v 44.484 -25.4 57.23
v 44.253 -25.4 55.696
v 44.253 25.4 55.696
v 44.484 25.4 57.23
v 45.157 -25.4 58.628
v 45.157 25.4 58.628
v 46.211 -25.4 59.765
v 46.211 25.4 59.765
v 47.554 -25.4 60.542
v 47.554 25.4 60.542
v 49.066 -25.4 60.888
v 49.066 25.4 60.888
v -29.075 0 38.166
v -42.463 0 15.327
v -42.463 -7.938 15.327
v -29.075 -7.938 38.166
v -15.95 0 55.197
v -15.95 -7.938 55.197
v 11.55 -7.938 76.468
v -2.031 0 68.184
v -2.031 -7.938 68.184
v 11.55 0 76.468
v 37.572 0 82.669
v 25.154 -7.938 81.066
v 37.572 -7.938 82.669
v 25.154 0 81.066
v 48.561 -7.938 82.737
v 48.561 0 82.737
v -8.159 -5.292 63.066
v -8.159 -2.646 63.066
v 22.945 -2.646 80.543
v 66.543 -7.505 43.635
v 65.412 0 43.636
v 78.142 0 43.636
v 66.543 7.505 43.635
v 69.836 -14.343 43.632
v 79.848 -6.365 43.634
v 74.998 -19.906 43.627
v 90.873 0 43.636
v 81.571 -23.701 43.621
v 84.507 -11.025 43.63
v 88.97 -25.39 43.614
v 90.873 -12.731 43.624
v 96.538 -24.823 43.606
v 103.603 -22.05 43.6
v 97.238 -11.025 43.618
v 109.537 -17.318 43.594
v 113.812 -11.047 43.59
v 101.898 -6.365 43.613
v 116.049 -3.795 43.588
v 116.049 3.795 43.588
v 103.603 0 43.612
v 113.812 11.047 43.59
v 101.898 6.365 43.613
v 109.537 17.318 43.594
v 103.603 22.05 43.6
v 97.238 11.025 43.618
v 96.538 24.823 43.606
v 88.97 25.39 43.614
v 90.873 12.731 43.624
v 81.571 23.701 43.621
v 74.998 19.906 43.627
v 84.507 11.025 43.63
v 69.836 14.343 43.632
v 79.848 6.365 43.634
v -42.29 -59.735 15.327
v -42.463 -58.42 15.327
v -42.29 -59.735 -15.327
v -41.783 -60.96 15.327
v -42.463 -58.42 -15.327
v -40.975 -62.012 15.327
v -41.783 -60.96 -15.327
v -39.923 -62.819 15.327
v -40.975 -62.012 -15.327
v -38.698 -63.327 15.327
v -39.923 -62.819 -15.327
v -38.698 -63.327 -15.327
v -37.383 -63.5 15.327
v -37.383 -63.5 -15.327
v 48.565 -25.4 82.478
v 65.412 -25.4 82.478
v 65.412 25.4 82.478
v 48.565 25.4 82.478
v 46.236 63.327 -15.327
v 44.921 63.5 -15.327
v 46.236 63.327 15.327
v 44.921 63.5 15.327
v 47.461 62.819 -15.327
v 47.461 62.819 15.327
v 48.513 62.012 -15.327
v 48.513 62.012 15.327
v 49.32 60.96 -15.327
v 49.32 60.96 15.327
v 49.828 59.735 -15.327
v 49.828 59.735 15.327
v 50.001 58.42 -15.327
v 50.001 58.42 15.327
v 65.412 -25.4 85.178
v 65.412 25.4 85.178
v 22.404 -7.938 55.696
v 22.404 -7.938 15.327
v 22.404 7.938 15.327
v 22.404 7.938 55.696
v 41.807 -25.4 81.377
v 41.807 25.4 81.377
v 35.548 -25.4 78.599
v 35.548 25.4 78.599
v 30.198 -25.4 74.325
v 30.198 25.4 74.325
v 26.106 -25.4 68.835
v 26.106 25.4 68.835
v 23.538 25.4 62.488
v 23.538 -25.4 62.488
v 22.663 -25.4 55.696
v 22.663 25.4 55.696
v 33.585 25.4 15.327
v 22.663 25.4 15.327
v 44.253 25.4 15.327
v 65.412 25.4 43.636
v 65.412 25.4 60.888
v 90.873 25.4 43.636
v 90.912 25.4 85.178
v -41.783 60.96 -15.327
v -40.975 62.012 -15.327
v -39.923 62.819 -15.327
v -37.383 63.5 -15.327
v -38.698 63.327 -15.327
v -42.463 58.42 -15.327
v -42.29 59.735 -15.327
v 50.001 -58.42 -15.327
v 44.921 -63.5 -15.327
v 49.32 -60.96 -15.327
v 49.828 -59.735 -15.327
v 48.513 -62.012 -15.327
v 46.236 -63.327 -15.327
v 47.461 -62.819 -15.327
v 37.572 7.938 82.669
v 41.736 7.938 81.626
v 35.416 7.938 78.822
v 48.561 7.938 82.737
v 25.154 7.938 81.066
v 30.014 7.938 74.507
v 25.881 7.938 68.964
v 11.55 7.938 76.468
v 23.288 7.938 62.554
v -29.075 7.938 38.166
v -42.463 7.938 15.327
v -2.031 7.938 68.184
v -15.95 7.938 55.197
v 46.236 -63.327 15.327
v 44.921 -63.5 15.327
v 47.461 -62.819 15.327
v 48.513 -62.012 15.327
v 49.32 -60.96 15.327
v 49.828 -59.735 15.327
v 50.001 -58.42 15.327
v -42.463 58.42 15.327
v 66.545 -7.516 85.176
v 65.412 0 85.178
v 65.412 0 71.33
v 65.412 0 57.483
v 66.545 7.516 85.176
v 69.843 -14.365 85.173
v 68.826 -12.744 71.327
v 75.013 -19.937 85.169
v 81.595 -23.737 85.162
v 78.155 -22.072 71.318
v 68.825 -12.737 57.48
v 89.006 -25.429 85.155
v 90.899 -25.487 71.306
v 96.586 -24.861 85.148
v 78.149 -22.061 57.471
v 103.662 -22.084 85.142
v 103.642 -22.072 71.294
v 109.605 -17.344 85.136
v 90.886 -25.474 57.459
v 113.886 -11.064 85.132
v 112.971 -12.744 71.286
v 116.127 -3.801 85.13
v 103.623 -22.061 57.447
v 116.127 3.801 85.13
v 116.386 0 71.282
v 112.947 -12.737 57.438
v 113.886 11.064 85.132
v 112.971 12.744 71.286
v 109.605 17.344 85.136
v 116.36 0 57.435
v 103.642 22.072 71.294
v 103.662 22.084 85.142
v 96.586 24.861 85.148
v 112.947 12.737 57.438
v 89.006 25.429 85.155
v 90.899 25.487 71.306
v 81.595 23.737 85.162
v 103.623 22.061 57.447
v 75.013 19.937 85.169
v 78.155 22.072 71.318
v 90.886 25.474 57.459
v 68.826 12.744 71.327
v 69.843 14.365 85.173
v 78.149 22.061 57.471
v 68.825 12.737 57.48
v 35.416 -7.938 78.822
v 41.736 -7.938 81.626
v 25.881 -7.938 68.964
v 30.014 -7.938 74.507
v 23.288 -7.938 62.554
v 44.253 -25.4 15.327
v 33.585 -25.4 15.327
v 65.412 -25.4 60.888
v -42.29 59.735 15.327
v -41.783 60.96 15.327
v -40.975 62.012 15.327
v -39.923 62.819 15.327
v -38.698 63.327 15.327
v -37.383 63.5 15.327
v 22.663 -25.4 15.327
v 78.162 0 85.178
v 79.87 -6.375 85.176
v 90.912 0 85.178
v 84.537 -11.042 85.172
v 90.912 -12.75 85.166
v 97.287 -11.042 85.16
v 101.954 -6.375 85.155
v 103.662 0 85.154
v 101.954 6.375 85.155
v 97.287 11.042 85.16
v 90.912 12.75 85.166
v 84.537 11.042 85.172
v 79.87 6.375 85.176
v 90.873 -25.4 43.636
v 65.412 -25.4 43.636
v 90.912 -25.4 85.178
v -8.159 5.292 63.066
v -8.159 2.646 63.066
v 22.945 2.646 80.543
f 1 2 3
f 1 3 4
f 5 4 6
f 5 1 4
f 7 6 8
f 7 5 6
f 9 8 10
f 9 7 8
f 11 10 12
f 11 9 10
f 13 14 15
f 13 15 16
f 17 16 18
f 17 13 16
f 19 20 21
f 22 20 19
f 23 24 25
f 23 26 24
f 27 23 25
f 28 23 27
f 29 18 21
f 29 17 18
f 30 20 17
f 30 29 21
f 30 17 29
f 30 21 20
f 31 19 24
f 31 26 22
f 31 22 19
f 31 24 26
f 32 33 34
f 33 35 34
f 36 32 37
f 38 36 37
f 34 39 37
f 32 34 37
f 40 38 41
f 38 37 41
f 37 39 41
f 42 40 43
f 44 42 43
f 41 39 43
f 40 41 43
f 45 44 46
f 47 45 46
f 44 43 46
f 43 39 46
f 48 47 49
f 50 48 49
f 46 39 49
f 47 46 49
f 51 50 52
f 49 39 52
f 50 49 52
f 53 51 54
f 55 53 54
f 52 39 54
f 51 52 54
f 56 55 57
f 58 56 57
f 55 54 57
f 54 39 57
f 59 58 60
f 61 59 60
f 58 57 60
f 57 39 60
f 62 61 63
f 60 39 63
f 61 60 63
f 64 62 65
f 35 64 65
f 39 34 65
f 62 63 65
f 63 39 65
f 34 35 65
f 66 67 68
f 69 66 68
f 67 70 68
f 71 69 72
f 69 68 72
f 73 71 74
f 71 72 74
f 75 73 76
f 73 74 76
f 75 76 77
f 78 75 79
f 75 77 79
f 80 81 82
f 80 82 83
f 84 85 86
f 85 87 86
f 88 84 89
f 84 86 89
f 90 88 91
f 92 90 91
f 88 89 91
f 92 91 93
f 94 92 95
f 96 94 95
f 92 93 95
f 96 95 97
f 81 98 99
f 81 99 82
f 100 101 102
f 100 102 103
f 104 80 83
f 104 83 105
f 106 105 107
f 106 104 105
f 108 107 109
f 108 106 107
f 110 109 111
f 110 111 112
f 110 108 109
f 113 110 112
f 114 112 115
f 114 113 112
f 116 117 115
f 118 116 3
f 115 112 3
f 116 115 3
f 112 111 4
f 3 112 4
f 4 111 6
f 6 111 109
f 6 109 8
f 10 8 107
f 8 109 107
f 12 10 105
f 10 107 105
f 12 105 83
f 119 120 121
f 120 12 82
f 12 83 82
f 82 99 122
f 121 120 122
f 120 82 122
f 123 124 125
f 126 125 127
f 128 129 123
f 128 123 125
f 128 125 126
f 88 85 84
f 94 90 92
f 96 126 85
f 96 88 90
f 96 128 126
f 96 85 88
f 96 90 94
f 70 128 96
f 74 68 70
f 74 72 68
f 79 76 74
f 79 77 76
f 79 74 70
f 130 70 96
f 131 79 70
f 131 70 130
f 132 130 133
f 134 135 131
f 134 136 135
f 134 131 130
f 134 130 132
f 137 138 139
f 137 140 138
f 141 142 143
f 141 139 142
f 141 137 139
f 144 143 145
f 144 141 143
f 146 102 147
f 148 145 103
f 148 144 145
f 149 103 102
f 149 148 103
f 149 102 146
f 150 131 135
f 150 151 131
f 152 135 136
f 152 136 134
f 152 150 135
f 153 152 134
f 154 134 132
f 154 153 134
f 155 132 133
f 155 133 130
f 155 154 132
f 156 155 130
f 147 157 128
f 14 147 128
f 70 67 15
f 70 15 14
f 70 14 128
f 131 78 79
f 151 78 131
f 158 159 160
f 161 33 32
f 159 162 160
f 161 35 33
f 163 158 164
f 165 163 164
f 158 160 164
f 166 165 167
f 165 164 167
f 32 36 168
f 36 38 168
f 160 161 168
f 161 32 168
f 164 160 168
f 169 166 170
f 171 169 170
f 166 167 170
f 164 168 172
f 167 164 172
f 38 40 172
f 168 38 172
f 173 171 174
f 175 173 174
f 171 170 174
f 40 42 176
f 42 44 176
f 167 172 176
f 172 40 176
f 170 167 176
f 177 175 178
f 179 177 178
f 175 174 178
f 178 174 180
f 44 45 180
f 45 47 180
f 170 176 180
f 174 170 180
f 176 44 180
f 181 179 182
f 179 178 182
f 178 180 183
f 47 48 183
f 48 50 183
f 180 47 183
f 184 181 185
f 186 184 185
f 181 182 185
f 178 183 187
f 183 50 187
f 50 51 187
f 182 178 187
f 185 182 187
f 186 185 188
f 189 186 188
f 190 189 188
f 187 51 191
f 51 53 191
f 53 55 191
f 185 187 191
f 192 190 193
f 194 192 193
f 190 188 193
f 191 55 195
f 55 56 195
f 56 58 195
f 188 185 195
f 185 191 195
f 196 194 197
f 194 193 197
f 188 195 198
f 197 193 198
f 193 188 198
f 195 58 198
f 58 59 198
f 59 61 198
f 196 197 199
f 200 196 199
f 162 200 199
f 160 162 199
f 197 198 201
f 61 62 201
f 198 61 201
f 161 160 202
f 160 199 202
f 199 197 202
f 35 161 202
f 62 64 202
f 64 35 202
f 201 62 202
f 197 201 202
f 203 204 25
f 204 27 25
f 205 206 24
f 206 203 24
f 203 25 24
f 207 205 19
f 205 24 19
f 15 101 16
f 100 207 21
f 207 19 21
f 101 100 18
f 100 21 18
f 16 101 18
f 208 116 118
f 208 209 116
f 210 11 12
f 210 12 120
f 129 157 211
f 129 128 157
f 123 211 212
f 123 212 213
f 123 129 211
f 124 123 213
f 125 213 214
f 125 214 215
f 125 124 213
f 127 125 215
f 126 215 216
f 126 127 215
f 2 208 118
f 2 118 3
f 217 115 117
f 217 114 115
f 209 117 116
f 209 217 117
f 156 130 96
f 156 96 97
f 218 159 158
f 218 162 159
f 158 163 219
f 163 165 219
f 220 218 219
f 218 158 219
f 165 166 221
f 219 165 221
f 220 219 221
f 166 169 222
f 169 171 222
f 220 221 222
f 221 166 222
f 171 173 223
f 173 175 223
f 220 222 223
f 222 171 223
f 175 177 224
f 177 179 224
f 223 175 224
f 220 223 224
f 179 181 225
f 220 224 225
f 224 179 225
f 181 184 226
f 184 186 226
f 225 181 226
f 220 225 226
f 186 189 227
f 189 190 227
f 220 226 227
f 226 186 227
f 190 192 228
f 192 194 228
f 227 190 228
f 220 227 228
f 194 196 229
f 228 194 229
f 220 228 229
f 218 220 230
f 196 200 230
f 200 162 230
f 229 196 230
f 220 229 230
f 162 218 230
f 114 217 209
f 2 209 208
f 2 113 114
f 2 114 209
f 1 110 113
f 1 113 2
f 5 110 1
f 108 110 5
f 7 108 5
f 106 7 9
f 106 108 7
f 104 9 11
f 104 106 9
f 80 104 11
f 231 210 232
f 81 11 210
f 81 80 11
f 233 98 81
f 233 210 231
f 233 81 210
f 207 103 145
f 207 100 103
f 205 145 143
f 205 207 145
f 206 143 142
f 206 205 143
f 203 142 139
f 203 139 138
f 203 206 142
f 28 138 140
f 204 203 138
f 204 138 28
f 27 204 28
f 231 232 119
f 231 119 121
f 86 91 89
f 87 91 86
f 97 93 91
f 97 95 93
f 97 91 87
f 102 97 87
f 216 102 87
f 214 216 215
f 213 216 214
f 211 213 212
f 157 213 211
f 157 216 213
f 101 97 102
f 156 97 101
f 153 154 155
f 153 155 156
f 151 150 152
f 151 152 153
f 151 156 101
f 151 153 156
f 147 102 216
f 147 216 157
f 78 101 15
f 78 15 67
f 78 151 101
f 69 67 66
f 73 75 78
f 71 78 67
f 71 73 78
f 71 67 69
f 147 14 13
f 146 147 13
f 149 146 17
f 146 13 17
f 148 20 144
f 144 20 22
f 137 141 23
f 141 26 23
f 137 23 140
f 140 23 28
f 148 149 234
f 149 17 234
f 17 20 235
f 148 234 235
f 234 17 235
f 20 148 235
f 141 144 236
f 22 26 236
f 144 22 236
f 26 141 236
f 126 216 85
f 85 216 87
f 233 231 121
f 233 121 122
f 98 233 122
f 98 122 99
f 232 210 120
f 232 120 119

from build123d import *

# Parameters (mm, degrees)
F1_DEPTH = 63.5
F2_DEPTH = 25.4
F3_DEPTH = 7.9375
F5_R     = 5.08


# Not quite as in the source:
# - ends of sketch curves that miss each other by under 0.0002 mm in the source are joined


with BuildPart() as f1:
    # F0 (on Front) → F1 (new body, symmetric)
    with BuildSketch(Plane.XZ):
        Polygon((-42.4631357271, 15.3269270076), (-42.4631357271, -15.3269278245), (50.0009615827, -15.3269278245), (50.0009615827, 15.3269270076), (44.2532325515, 15.3269270076), (33.5852317512, 15.3269270076), (22.6632287853, 15.3269270076), (22.4044577503, 15.3269270076), align=None)
    extrude(amount=F1_DEPTH, both=True)

    # F0 (on Front) → F3 (join, symmetric)
    with BuildSketch(Plane.XZ):
        with BuildLine():
            add(Edge.make_bspline(
                [(-42.4631357271, 15.3269270076), (-7.3203722905, 83.1905780265), (26.4507513371, 83.1905752423), (48.56082653, 82.7370360494)],
                knots=[0, 0, 0, 0, 113.2673143763, 113.2673143763, 113.2673143763, 113.2673143763], degree=3))
            Line((-42.4631357271, 15.3269270076), (22.4044577503, 15.3269270076))
            Line((22.4044577503, 15.3269270076), (22.4044577503, 55.6962154806))
            ThreePointArc((22.4044577503, 55.6962154806), (30.0135223742, 74.5068614342), (48.56082653, 82.7370360494))
        make_face()
    extrude(amount=F3_DEPTH, both=True)

    # F5
    f5_edges = [f1.edges().sort_by_distance(p)[0] for p in [
        (-42.463136, -63.5, 0),
        (50.000962, -63.5, 0),
        (50.000962, 63.5, 0),
        (-42.463136, 63.5, 0),
    ]]
    fillet(f5_edges, radius=F5_R)


with BuildPart() as f2:
    # F0 (on Front) → F2 (new body, symmetric)
    with BuildSketch(Plane.XZ):
        with BuildLine():
            Line((33.5852317512, 15.3269270076), (44.2532325515, 15.3269270076))
            Line((44.2532325515, 15.3269270076), (44.2532325515, 55.6962154806))
            ThreePointArc((44.2532325515, 55.6962154806), (45.6414524036, 59.2359562846), (49.0658950772, 60.8882612482))
            Line((49.0658950772, 60.8882612482), (65.4116496444, 60.8882612482))
            Line((65.4116496444, 60.8882612482), (65.4116496444, 71.5562620485))
            Line((65.4116496444, 71.5562620485), (48.7713574063, 71.5562620485))
            ThreePointArc((48.7713574063, 71.5562620485), (37.9939440951, 66.6752806679), (33.5852317512, 55.6962154806))
            Line((33.5852317512, 55.6962154806), (33.5852317512, 15.3269270076))
        make_face()
        with BuildLine():
            Line((22.6632287853, 55.6962154806), (22.6632287853, 15.326927416))
            Line((22.6632287853, 15.326927416), (33.5852317512, 15.3269270076))
            Line((33.5852317512, 15.3269270076), (33.5852317512, 55.6962154806))
            ThreePointArc((33.5852317512, 55.6962154806), (37.9939440951, 66.6752806679), (48.7713574063, 71.5562620485))
            Line((48.7713574063, 71.5562620485), (65.4116496444, 71.5562620485))
            Line((65.4116496444, 71.5562620485), (65.4116496444, 82.4782650144))
            Line((65.4116496444, 82.4782650144), (48.565139174, 82.4782650144))
            ThreePointArc((48.565139174, 82.4782650144), (30.1980256678, 74.325407217), (22.6632287853, 55.6962154806))
        make_face()
        Polygon((65.4116496444, 85.1775221527), (65.4116496444, 82.7370360494), (65.4116496444, 82.4782650144), (65.4116496444, 71.5562620485), (65.4116496444, 60.8882612482), (65.4116496444, 43.6356849968), (90.872772038, 43.6356849968), (90.9117330309, 85.1775221527), align=None)
    extrude(amount=F2_DEPTH, both=True)


with BuildPart() as f4:
    # F0 (on Front) → F4 (revolve)
    with BuildSketch(Plane.XZ):
        Polygon((65.4116496444, 85.1775221527), (65.4116496444, 82.7370360494), (65.4116496444, 82.4782650144), (65.4116496444, 71.5562620485), (65.4116496444, 60.8882612482), (65.4116496444, 43.6356849968), (90.872772038, 43.6356849968), (90.9117330309, 85.1775221527), align=None)
    revolve(axis=Axis((90.8922525345, 0, 64.4066035748), (0.0009378732, 0, 0.9999995602)))


solid = Compound([f1.part, f2.part, f4.part])
